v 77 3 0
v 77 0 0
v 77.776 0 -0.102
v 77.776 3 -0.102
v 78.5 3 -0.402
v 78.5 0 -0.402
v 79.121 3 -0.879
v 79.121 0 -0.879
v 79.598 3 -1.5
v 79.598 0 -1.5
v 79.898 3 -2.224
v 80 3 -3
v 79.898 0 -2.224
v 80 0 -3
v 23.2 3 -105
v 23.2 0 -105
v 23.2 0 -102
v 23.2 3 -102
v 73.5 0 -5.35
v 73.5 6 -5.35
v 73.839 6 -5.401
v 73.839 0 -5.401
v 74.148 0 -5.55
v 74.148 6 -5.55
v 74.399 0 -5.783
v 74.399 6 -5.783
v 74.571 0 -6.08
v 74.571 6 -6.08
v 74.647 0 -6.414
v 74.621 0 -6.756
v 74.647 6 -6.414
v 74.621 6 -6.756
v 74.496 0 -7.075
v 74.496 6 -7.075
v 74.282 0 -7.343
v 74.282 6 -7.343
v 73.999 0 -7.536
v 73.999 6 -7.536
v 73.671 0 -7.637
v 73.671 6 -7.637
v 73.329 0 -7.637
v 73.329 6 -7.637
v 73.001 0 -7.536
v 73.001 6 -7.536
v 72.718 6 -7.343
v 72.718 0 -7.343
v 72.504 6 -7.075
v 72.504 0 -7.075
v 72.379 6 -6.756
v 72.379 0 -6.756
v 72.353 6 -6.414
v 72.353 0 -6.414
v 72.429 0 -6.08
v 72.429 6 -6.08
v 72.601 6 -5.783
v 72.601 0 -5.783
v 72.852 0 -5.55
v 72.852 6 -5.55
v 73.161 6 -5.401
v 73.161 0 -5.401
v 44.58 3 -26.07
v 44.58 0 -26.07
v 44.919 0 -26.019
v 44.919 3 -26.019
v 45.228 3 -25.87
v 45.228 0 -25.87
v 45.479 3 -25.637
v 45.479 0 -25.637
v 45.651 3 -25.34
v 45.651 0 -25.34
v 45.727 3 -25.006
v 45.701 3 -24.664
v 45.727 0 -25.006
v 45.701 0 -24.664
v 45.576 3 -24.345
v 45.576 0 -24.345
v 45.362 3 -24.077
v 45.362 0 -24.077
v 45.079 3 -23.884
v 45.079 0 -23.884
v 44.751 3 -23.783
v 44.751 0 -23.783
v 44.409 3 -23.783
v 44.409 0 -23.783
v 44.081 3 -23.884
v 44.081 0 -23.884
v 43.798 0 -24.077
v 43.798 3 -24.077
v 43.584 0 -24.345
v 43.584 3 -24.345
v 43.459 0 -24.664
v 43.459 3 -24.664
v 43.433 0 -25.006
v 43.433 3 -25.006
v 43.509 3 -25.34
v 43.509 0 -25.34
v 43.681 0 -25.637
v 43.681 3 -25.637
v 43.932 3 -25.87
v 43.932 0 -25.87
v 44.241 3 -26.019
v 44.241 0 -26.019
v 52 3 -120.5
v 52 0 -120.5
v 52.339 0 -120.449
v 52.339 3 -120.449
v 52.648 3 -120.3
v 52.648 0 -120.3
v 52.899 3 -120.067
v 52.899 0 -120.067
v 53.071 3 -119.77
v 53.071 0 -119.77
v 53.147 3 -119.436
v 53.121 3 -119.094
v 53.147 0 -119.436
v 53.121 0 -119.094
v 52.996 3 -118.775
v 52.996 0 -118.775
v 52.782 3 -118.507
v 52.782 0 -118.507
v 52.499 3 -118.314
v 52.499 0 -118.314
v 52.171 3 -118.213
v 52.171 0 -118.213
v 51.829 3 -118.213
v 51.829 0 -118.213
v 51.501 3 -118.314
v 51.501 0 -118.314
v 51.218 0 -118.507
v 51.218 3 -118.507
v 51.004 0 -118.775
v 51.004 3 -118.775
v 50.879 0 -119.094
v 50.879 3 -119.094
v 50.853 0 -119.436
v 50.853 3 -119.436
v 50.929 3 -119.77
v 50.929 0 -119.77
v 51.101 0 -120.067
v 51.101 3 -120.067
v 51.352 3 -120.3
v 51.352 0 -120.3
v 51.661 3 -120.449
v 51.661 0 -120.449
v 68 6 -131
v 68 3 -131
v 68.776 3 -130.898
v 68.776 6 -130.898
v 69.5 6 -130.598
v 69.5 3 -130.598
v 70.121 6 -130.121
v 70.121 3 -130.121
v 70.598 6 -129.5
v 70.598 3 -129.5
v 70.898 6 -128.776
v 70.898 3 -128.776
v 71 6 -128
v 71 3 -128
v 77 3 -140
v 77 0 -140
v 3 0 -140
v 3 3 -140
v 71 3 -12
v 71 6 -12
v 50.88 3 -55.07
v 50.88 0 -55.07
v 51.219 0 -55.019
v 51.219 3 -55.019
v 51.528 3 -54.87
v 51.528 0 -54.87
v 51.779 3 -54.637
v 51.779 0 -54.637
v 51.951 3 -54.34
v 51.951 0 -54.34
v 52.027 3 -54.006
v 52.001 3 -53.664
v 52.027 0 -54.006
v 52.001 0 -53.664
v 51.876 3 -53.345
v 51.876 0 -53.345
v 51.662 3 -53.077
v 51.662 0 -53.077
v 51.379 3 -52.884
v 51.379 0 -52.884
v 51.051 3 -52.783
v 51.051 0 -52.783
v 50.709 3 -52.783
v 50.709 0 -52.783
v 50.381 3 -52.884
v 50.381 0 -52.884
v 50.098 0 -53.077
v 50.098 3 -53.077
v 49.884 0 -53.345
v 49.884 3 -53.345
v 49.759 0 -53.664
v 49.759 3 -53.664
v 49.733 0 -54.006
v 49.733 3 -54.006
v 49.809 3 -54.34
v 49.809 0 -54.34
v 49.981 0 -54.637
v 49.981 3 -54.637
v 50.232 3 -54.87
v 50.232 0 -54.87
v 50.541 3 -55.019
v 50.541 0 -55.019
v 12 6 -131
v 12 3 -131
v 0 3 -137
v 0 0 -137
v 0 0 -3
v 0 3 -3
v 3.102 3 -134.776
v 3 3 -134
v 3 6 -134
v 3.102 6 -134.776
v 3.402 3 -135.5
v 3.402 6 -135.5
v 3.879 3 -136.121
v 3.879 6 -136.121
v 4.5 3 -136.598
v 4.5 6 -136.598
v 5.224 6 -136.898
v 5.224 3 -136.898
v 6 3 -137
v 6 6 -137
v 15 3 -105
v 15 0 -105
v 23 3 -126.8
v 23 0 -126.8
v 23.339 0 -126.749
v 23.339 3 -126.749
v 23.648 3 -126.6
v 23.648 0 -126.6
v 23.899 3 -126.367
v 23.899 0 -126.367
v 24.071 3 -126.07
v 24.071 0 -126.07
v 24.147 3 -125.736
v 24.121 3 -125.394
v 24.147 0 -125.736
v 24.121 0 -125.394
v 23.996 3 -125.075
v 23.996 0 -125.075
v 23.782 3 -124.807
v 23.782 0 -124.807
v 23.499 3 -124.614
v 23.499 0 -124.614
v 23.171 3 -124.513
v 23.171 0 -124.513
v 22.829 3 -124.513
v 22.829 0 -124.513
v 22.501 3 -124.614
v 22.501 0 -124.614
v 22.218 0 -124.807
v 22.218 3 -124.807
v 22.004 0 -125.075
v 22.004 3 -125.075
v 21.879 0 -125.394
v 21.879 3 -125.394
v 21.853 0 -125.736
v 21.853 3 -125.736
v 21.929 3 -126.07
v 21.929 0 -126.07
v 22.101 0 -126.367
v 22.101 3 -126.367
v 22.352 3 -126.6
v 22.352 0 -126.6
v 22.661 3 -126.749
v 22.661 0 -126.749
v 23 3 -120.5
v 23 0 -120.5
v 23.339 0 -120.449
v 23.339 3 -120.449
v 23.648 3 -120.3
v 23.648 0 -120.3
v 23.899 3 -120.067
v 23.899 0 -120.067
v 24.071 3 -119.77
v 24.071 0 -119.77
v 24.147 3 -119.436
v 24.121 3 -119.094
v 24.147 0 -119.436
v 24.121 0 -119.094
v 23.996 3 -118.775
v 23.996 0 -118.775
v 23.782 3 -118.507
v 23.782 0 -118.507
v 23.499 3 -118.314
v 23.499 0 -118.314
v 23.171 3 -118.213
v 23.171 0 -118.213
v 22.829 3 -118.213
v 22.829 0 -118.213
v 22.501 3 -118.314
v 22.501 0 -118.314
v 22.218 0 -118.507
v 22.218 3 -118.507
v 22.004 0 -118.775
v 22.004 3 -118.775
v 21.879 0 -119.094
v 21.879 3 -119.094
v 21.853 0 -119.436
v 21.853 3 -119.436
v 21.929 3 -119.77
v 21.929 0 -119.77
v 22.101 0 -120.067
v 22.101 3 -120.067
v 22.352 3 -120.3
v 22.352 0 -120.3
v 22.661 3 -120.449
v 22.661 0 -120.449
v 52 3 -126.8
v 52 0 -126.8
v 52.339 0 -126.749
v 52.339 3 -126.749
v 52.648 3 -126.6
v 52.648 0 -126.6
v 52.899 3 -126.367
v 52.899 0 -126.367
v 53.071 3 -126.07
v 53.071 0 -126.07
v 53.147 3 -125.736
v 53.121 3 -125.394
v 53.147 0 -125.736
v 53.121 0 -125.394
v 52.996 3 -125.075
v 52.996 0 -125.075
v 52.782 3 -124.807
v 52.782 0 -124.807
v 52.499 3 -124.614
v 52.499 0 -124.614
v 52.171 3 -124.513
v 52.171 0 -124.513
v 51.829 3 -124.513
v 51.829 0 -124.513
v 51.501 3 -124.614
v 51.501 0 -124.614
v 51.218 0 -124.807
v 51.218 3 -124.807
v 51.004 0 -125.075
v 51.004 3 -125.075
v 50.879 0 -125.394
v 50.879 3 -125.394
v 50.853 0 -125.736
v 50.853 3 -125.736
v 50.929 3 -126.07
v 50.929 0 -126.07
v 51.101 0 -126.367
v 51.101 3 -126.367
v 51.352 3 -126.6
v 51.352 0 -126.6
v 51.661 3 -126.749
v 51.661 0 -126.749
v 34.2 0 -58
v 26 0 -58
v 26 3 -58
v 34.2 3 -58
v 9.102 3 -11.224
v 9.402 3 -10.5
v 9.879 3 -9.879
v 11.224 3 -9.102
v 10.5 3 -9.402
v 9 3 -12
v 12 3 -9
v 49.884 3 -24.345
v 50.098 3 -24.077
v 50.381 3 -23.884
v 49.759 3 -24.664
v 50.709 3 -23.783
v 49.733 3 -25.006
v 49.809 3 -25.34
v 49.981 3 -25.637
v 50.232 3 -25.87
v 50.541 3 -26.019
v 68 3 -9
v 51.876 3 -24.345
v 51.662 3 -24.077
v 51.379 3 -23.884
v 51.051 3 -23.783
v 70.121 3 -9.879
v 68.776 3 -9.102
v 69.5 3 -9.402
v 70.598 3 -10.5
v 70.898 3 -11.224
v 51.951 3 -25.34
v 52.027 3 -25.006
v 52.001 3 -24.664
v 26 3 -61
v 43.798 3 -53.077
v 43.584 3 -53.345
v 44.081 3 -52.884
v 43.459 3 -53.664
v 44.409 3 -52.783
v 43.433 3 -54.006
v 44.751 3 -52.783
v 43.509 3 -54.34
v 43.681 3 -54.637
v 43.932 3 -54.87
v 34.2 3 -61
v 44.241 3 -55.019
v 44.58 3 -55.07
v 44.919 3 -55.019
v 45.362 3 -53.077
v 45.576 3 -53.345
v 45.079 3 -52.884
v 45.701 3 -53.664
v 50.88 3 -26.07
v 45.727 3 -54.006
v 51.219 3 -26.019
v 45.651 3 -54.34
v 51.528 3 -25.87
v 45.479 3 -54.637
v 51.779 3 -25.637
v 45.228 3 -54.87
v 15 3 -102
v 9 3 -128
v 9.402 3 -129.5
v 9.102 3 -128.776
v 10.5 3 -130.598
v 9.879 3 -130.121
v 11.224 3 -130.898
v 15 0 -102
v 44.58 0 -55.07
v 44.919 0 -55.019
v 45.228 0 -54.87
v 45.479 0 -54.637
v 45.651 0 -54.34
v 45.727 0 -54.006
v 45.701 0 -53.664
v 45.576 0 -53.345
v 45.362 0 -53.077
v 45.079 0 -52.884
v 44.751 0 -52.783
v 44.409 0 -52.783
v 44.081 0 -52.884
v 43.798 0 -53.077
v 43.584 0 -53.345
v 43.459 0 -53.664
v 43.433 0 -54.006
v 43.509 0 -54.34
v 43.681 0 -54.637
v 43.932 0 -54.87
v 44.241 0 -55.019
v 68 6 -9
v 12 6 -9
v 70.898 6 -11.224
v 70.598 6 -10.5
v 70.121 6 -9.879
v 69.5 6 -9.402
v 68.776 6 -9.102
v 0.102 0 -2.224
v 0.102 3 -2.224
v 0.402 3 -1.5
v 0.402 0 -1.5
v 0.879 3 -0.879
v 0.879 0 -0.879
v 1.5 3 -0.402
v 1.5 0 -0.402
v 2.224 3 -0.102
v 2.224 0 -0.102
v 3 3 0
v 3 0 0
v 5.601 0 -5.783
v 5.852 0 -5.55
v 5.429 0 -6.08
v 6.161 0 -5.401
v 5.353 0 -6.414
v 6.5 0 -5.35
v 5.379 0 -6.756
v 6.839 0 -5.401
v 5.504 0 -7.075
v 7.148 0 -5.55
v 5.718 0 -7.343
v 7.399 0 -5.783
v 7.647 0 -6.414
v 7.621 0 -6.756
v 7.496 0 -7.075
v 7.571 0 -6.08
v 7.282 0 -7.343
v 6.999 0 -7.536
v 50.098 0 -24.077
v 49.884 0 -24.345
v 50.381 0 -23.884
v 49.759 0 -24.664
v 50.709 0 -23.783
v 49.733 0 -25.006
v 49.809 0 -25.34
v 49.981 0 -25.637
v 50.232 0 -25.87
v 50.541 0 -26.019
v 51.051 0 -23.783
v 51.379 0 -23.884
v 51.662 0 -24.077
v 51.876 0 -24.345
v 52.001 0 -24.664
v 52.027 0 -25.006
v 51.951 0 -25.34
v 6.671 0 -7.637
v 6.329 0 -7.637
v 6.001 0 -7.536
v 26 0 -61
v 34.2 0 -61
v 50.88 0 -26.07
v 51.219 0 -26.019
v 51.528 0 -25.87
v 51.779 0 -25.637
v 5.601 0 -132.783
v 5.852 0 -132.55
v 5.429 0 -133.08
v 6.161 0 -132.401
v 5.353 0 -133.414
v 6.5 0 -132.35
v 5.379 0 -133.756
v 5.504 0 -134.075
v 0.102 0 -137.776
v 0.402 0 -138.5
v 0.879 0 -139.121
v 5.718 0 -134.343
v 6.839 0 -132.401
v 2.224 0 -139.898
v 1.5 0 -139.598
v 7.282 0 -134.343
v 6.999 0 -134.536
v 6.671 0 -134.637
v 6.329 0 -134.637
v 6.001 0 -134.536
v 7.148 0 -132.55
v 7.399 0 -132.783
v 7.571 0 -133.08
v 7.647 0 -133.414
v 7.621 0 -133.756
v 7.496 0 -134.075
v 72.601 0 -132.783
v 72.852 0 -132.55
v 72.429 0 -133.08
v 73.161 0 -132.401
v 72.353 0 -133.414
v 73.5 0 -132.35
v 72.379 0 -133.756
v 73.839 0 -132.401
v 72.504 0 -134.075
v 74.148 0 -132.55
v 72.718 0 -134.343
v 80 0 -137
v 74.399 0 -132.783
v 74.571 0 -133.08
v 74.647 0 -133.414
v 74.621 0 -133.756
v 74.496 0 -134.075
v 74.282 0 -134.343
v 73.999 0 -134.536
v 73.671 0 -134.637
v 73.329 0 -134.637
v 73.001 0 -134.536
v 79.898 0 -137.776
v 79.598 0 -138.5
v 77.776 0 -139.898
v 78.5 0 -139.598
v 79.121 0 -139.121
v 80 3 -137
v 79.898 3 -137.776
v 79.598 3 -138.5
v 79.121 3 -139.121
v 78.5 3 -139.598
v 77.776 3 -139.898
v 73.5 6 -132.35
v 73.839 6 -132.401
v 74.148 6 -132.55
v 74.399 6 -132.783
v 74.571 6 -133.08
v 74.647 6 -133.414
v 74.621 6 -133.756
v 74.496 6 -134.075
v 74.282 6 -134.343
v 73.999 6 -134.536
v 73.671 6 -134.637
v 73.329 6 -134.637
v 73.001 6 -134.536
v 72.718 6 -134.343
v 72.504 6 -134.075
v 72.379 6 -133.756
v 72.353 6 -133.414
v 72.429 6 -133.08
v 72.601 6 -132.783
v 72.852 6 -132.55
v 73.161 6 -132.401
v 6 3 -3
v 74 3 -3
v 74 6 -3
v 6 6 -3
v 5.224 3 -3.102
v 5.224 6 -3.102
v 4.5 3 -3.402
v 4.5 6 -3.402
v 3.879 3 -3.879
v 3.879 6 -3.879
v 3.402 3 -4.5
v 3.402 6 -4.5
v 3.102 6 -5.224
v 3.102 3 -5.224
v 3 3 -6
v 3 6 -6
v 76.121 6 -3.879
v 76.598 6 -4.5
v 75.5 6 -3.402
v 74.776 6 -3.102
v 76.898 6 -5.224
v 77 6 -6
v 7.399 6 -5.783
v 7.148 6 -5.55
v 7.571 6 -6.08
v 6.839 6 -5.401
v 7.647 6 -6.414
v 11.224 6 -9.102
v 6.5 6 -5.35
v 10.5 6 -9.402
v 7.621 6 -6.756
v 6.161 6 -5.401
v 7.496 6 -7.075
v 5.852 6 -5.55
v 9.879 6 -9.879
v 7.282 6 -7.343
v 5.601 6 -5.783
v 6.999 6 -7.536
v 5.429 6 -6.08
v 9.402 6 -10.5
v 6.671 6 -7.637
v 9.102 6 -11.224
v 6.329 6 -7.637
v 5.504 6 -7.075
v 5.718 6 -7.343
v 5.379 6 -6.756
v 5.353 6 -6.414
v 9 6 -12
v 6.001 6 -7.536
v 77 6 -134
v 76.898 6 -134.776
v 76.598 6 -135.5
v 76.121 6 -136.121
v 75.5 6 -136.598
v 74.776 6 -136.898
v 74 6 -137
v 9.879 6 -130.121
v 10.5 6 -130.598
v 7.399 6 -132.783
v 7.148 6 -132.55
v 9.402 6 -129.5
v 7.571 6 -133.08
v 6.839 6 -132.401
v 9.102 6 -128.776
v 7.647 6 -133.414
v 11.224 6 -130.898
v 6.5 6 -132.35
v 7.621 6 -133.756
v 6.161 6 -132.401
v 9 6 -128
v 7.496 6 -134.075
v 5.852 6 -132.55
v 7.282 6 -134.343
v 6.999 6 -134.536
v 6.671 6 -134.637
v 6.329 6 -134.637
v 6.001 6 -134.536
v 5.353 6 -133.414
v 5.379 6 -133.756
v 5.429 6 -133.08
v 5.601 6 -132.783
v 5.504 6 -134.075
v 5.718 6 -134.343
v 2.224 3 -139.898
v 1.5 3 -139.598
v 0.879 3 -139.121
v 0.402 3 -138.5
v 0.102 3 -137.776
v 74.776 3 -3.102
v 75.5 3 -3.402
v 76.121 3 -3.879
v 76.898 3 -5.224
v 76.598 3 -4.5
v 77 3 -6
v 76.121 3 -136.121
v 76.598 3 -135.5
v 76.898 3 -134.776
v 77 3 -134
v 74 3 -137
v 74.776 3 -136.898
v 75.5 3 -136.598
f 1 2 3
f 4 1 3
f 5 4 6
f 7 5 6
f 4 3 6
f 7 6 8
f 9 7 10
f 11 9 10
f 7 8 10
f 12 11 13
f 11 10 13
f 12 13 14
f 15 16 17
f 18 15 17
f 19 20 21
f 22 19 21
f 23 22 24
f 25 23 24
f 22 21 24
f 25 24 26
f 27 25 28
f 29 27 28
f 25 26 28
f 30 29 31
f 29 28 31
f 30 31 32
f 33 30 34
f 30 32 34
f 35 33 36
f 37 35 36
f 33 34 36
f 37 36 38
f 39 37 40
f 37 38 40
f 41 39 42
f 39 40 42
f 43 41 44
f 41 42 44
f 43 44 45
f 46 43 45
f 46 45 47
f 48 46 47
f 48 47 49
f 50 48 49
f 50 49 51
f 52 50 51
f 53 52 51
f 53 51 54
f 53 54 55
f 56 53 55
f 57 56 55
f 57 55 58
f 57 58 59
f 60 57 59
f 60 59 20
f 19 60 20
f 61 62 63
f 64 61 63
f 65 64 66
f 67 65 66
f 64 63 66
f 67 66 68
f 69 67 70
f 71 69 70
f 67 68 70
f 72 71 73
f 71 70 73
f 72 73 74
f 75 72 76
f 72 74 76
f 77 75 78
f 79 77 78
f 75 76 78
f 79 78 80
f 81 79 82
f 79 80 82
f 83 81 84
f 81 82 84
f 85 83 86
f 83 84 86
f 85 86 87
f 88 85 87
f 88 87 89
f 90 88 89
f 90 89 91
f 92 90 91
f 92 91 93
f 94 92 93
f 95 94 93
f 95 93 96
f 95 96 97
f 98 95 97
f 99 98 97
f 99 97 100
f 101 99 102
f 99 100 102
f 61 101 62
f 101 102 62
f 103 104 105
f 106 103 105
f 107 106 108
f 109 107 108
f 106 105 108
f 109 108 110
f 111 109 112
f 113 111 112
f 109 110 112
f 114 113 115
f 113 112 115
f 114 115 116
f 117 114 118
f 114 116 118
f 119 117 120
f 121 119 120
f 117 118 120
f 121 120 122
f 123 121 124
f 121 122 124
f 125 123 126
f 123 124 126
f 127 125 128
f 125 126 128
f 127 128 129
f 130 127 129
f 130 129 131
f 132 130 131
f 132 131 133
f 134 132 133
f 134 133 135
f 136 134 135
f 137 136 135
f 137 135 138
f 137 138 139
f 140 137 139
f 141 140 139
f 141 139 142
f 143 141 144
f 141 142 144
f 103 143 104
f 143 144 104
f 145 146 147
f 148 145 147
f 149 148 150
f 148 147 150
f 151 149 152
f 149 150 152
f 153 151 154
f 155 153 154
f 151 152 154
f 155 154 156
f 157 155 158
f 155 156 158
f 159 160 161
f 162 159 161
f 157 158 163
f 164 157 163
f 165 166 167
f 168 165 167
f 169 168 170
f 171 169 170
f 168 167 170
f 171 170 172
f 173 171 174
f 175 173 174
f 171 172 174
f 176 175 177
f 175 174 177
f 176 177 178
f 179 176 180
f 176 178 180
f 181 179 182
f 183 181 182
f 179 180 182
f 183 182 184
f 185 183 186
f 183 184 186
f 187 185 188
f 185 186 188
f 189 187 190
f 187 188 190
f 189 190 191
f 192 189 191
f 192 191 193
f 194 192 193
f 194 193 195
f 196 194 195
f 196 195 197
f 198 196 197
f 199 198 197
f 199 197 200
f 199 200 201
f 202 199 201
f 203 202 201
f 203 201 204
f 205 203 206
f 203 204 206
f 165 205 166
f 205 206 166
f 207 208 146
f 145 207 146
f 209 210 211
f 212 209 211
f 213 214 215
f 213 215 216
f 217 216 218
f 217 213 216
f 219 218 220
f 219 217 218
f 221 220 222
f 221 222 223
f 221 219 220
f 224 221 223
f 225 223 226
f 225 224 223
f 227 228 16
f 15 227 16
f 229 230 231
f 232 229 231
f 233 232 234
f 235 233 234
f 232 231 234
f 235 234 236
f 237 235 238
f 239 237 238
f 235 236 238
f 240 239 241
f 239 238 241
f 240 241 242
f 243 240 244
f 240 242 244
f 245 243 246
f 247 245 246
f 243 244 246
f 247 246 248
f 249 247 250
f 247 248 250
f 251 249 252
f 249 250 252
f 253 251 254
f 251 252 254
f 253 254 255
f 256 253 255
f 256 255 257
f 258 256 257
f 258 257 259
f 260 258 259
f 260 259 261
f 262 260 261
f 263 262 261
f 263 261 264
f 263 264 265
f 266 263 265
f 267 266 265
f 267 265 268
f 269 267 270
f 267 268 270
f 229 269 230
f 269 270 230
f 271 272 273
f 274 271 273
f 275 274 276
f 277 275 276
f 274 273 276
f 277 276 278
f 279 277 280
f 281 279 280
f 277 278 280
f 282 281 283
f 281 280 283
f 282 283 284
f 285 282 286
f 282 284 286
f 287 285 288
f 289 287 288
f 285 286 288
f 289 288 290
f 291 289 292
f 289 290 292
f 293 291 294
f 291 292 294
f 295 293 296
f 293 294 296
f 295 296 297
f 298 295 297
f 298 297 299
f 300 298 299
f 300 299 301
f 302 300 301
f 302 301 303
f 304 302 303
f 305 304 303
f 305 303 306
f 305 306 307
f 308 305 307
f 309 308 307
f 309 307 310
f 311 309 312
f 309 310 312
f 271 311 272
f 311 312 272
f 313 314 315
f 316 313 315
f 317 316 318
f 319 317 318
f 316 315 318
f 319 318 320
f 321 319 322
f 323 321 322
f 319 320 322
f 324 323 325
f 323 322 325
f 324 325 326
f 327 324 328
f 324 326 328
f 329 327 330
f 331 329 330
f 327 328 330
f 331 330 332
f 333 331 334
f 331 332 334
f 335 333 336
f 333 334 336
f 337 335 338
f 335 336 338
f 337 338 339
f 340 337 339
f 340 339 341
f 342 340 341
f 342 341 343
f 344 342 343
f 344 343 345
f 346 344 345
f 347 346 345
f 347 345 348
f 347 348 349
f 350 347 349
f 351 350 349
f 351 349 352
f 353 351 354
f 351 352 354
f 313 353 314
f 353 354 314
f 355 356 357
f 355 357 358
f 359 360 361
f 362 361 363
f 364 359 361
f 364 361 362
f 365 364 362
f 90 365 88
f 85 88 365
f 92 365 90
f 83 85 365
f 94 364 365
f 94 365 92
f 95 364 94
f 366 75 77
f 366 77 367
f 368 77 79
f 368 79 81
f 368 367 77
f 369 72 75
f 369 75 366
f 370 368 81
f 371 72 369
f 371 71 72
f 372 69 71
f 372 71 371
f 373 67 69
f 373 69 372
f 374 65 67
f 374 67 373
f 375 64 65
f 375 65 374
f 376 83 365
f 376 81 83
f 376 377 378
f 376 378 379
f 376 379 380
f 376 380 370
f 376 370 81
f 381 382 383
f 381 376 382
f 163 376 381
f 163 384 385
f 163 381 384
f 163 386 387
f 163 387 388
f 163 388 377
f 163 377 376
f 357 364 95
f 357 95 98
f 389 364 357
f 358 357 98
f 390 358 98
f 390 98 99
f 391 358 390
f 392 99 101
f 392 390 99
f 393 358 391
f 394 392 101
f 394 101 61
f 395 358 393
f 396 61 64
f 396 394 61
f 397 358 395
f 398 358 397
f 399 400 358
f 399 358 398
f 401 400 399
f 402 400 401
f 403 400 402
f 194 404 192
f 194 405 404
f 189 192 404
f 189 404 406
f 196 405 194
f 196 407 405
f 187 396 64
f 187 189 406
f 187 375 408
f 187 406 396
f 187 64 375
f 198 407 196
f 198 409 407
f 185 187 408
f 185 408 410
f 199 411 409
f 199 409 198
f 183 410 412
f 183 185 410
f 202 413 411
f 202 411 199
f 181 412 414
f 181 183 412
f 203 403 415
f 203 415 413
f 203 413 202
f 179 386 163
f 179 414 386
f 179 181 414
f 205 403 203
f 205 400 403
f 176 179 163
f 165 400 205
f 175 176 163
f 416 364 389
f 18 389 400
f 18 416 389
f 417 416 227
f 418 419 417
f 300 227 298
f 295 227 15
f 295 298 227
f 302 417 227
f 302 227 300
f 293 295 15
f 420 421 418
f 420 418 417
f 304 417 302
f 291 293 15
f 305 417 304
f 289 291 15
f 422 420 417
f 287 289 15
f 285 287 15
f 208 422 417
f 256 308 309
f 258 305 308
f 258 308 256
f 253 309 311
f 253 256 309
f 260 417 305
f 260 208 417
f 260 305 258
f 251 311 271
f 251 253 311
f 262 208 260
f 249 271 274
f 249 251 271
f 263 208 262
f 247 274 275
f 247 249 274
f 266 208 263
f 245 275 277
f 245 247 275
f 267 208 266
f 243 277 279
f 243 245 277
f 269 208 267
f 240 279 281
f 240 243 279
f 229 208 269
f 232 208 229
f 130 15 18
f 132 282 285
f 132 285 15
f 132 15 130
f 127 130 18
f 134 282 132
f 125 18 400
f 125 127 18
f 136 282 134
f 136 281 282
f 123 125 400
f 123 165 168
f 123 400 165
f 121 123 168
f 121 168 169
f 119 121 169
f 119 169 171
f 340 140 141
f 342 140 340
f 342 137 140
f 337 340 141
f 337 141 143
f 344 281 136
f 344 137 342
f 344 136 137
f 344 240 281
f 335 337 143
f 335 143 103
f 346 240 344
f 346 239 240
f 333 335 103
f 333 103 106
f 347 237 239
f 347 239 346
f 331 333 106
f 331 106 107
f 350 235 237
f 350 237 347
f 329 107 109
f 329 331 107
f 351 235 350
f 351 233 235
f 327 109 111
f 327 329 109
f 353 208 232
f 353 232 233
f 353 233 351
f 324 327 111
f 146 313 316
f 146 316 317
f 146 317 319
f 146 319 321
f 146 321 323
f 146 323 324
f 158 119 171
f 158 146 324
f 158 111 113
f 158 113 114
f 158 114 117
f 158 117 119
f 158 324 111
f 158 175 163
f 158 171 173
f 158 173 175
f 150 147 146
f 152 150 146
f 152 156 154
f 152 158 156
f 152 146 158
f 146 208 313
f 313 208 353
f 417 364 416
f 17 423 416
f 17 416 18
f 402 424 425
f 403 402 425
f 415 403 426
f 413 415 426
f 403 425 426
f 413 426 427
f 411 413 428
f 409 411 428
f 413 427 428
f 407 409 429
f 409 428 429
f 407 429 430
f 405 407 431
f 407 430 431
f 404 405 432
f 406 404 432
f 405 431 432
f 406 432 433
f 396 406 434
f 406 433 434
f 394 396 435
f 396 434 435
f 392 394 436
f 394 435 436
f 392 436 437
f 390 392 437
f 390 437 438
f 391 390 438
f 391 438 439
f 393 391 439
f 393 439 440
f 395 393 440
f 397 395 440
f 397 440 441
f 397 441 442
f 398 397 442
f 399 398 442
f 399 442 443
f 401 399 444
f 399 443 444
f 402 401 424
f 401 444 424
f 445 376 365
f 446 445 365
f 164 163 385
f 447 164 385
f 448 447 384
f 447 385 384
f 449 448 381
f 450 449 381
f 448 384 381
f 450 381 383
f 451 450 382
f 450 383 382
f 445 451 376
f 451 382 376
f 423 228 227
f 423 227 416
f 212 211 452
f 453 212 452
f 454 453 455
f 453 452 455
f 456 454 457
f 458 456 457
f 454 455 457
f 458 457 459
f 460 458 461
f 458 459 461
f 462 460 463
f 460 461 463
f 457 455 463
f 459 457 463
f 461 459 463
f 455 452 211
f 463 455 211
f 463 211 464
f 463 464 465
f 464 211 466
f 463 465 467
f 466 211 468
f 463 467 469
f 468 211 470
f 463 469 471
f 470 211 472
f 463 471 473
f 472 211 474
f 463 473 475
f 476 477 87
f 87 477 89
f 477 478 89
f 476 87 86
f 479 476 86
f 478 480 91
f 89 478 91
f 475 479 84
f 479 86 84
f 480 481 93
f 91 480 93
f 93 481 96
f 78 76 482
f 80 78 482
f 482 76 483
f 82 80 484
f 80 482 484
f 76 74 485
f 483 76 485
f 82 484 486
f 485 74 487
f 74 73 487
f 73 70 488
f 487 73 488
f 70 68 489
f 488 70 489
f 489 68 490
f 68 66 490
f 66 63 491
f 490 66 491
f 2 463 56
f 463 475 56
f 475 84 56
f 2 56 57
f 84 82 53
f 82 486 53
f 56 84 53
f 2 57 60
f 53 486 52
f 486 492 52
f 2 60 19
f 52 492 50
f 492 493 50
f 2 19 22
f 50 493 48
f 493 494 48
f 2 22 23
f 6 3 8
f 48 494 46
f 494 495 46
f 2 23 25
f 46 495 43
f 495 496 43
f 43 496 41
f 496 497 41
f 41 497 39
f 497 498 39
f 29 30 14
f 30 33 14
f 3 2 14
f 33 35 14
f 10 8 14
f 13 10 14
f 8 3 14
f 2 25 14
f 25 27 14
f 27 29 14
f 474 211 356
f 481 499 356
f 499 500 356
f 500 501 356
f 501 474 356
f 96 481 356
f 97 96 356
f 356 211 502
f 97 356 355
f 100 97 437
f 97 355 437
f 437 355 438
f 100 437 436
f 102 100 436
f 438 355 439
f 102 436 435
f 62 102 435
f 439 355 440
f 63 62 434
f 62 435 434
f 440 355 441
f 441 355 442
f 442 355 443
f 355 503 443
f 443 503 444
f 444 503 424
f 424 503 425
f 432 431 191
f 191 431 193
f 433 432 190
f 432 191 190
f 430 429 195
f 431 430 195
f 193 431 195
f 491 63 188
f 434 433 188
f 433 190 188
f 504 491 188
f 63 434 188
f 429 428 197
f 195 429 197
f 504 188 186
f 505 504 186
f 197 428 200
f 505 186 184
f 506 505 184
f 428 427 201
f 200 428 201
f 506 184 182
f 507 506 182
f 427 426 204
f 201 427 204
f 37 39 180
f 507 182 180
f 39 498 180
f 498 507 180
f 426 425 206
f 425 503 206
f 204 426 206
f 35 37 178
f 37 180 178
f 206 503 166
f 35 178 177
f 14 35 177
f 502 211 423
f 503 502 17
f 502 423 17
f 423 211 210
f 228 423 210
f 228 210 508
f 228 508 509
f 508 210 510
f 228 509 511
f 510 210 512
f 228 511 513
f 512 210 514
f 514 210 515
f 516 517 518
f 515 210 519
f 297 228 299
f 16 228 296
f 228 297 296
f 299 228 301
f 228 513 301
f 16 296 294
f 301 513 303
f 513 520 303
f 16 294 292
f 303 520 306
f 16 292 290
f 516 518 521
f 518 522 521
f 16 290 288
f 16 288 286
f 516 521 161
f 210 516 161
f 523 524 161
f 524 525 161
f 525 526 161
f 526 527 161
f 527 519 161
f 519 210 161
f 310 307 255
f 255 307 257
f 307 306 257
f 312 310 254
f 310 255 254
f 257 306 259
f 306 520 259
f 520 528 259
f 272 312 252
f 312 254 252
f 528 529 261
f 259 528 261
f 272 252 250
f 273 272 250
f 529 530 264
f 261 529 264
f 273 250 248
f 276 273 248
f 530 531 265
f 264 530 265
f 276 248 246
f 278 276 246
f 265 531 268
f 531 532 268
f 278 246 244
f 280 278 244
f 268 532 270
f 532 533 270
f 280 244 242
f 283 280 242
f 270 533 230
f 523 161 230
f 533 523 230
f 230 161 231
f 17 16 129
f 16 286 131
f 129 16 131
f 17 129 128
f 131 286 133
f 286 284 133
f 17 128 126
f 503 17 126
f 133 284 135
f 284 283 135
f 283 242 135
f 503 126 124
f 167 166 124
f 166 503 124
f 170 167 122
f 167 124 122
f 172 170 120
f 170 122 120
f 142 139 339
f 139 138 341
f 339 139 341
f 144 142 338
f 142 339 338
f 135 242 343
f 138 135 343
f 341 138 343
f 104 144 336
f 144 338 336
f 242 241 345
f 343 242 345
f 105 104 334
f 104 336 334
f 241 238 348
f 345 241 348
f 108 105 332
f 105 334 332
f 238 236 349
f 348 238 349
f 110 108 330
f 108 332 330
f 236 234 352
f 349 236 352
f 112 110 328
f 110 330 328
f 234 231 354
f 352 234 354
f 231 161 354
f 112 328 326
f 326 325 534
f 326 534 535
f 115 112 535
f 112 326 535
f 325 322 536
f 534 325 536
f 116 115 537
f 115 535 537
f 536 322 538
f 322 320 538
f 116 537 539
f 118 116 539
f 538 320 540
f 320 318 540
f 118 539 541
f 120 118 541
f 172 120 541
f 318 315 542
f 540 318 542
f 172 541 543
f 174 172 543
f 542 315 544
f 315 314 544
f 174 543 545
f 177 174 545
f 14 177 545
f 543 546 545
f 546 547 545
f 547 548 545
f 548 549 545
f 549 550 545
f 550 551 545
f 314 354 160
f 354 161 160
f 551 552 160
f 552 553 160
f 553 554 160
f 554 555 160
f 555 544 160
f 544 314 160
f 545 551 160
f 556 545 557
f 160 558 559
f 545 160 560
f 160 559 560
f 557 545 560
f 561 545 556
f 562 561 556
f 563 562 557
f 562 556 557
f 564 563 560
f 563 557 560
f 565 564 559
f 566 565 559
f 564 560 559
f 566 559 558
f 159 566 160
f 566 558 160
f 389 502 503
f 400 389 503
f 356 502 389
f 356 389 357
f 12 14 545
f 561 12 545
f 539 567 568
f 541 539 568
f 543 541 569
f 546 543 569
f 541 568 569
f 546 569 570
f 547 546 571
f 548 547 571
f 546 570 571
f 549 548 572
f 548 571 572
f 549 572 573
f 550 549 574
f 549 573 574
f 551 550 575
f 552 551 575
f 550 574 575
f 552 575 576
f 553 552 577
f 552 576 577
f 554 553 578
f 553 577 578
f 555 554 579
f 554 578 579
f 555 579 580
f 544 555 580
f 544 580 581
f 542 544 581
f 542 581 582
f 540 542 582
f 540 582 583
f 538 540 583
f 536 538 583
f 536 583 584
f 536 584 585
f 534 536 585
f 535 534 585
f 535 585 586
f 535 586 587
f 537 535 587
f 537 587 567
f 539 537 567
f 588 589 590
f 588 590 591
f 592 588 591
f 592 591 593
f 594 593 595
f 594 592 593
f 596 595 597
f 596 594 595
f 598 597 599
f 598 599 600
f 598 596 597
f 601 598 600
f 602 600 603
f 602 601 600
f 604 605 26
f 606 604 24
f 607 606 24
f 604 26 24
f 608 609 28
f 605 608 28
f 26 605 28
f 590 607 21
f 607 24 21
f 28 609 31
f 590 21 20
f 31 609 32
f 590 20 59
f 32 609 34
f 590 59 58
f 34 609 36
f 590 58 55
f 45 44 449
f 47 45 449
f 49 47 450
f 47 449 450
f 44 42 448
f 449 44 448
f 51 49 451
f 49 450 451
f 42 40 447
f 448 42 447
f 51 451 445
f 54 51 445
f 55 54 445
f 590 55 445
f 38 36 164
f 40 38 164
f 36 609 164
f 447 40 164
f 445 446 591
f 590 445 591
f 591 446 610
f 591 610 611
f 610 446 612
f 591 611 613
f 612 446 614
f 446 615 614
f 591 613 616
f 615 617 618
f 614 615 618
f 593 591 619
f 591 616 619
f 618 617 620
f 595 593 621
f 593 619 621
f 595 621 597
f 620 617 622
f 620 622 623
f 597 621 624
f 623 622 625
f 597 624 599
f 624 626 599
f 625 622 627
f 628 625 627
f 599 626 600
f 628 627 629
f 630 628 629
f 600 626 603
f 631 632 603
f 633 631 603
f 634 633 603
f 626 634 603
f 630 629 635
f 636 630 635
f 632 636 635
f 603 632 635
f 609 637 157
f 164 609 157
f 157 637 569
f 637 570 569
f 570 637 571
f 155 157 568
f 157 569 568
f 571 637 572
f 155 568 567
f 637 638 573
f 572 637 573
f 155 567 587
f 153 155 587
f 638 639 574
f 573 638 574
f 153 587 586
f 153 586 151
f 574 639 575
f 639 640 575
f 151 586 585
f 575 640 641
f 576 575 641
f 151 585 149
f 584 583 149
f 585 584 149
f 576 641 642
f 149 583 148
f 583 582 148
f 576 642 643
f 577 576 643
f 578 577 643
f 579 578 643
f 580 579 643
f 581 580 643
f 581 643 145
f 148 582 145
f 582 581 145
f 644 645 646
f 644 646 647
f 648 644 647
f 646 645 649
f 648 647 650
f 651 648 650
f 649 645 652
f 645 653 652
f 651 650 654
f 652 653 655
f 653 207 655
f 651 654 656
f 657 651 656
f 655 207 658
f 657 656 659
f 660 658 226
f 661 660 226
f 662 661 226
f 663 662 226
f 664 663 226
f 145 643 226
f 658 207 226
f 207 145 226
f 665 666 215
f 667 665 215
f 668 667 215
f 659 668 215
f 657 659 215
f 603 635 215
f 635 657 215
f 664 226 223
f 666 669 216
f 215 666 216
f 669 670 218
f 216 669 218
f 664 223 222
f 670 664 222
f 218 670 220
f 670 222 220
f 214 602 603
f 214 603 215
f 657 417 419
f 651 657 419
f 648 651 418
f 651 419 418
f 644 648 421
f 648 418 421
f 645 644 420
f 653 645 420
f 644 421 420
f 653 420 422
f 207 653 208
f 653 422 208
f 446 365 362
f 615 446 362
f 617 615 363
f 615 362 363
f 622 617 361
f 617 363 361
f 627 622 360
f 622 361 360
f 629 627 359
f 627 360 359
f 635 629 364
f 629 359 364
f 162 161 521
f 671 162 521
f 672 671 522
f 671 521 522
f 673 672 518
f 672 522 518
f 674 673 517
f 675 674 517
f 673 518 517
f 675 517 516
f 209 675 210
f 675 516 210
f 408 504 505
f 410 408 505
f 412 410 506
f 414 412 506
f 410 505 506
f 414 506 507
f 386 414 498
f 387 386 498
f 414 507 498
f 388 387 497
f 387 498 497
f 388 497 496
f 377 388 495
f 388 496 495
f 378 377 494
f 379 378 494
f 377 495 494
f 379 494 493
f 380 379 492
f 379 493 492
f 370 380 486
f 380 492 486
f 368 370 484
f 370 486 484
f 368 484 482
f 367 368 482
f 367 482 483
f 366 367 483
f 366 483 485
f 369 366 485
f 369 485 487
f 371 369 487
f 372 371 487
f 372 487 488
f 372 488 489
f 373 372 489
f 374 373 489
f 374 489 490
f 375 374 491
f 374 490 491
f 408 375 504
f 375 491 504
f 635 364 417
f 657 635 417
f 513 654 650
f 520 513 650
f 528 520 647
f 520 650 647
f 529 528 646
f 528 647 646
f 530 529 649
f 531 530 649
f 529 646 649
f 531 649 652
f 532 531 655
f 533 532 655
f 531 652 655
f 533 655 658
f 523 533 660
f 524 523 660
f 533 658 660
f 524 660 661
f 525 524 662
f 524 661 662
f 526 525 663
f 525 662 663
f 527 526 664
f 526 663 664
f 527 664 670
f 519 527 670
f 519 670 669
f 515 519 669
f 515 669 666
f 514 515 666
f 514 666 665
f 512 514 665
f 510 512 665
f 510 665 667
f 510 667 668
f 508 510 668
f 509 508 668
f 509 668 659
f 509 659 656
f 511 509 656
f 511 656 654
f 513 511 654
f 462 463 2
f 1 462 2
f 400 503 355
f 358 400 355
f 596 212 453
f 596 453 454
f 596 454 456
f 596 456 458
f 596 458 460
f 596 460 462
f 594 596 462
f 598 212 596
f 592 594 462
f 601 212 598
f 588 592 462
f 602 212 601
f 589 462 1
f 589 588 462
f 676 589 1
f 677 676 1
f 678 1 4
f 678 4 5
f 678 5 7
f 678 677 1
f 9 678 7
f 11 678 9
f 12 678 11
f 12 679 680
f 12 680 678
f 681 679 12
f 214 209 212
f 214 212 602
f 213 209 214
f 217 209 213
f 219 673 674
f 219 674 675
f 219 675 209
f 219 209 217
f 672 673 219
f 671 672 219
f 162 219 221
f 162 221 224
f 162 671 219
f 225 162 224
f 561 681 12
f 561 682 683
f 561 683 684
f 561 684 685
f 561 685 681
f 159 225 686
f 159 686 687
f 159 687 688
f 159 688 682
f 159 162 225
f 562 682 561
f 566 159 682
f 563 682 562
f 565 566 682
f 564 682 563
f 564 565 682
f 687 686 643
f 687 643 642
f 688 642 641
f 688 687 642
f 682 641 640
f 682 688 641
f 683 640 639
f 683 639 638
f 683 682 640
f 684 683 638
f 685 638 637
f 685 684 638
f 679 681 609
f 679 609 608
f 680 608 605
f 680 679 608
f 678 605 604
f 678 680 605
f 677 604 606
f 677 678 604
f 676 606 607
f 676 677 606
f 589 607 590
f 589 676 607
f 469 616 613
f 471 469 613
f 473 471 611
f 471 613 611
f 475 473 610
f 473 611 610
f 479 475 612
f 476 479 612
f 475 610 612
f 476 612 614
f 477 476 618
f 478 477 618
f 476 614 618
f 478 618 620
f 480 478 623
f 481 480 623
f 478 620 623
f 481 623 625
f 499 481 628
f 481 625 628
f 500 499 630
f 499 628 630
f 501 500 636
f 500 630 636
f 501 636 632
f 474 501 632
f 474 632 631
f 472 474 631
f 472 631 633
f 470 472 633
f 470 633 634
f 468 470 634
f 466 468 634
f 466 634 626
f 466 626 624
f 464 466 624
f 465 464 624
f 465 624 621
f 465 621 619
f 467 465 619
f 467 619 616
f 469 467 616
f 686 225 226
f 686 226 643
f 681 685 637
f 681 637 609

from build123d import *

# Parameters (mm, degrees)
BOSS_EXTRUDE1_DEPTH = 3
BOSS_EXTRUDE2_DEPTH = 3
SKETCH3_R           = 1.15
CUT_EXTRUDE1_DEPTH  = 162.356747612
SKETCH4_W           = 8.2
SKETCH4_H           = 3
CUT_EXTRUDE2_DEPTH  = 10
SKETCH5_R           = 1.15
CUT_EXTRUDE3_DEPTH  = 3
SKETCH6_R           = 1.15
CUT_EXTRUDE4_DEPTH  = 3


with BuildPart() as part:
    # Sketch1 → Boss-Extrude1 (new body)
    with BuildSketch(Plane(origin=(0, 0, 0), x_dir=(1, 0, 0), z_dir=(0, 1, 0))):
        with BuildLine():
            Line((3, 0), (77, 0))
            ThreePointArc((77, 0), (79.121320344, 0.878679656), (80, 3))
            Line((80, 3), (80, 137))
            ThreePointArc((80, 137), (79.121320344, 139.121320344), (77, 140))
            Line((77, 140), (3, 140))
            ThreePointArc((3, 140), (0.878679656, 139.121320344), (0, 137))
            Line((0, 137), (0, 3))
            ThreePointArc((0, 3), (0.878679656, 0.878679656), (3, 0))
        make_face()
    extrude(amount=BOSS_EXTRUDE1_DEPTH)

    # Sketch2 → Boss-Extrude2 (add)
    with BuildSketch(Plane(origin=(0, 3, 0), x_dir=(1, 0, 0), z_dir=(0, 1, 0))):
        with BuildLine():
            Line((6, 137), (74, 137))
            ThreePointArc((74, 137), (76.121320344, 136.121320344), (77, 134))
            Line((77, 134), (77, 6))
            ThreePointArc((77, 6), (76.121320344, 3.878679656), (74, 3))
            Line((74, 3), (6, 3))
            ThreePointArc((6, 3), (3.878679656, 3.878679656), (3, 6))
            Line((3, 6), (3, 134))
            ThreePointArc((3, 134), (3.878679656, 136.121320344), (6, 137))
        make_face()
        with BuildLine():
            Line((12, 131), (68, 131))
            ThreePointArc((68, 131), (70.121320344, 130.121320344), (71, 128))
            Line((71, 128), (71, 12))
            ThreePointArc((71, 12), (70.121320344, 9.878679656), (68, 9))
            Line((68, 9), (12, 9))
            ThreePointArc((12, 9), (9.878679656, 9.878679656), (9, 12))
            Line((9, 12), (9, 128))
            ThreePointArc((9, 128), (9.878679656, 130.121320344), (12, 131))
        make_face(mode=Mode.SUBTRACT)
    extrude(amount=BOSS_EXTRUDE2_DEPTH)

    # Sketch3 → Cut-Extrude1 (cut, through all)
    with BuildSketch(Plane(origin=(0, 6, 0), x_dir=(1, 0, 0), z_dir=(0, 1, 0))):
        with Locations(Location((6.5, 133.5, 0), (0, 0, 270))):
            Circle(SKETCH3_R)
        with Locations(Location((73.5, 133.5, 0), (0, 0, 270))):
            Circle(SKETCH3_R)
        with Locations(Location((73.5, 6.5, 0), (0, 0, 270))):
            Circle(SKETCH3_R)
        with Locations(Location((6.5, 6.5, 0), (0, 0, 270))):
            Circle(SKETCH3_R)
    extrude(amount=-CUT_EXTRUDE1_DEPTH, mode=Mode.SUBTRACT)

    # Sketch4 → Cut-Extrude2 (cut)
    with BuildSketch(Plane.XZ):
        with Locations((30.1, -59.5)):
            Rectangle(SKETCH4_W, SKETCH4_H)
        with Locations((19.1, -103.5)):
            Rectangle(SKETCH4_W, SKETCH4_H)
    extrude(amount=-CUT_EXTRUDE2_DEPTH, mode=Mode.SUBTRACT)

    # Sketch5 → Cut-Extrude3 (cut)
    with BuildSketch(Plane.XZ):
        with Locations(Location((23, -125.65, 0), (0, 0, 270))):
            Circle(SKETCH5_R)
        with Locations(Location((52, -125.65, 0), (0, 0, 270))):
            Circle(SKETCH5_R)
        with Locations(Location((52, -119.35, 0), (0, 0, 270))):
            Circle(SKETCH5_R)
        with Locations(Location((23, -119.35, 0), (0, 0, 270))):
            Circle(SKETCH5_R)
    extrude(amount=-CUT_EXTRUDE3_DEPTH, mode=Mode.SUBTRACT)

    # Sketch6 → Cut-Extrude4 (cut)
    with BuildSketch(Plane.XZ):
        with Locations(Location((50.88, -53.92, 0), (0, 0, 270))):
            Circle(SKETCH6_R)
        with Locations(Location((44.58, -53.92, 0), (0, 0, 270))):
            Circle(SKETCH6_R)
        with Locations(Location((50.88, -24.92, 0), (0, 0, 270))):
            Circle(SKETCH6_R)
        with Locations(Location((44.58, -24.92, 0), (0, 0, 270))):
            Circle(SKETCH6_R)
    extrude(amount=-CUT_EXTRUDE4_DEPTH, mode=Mode.SUBTRACT)


solid = part.part
